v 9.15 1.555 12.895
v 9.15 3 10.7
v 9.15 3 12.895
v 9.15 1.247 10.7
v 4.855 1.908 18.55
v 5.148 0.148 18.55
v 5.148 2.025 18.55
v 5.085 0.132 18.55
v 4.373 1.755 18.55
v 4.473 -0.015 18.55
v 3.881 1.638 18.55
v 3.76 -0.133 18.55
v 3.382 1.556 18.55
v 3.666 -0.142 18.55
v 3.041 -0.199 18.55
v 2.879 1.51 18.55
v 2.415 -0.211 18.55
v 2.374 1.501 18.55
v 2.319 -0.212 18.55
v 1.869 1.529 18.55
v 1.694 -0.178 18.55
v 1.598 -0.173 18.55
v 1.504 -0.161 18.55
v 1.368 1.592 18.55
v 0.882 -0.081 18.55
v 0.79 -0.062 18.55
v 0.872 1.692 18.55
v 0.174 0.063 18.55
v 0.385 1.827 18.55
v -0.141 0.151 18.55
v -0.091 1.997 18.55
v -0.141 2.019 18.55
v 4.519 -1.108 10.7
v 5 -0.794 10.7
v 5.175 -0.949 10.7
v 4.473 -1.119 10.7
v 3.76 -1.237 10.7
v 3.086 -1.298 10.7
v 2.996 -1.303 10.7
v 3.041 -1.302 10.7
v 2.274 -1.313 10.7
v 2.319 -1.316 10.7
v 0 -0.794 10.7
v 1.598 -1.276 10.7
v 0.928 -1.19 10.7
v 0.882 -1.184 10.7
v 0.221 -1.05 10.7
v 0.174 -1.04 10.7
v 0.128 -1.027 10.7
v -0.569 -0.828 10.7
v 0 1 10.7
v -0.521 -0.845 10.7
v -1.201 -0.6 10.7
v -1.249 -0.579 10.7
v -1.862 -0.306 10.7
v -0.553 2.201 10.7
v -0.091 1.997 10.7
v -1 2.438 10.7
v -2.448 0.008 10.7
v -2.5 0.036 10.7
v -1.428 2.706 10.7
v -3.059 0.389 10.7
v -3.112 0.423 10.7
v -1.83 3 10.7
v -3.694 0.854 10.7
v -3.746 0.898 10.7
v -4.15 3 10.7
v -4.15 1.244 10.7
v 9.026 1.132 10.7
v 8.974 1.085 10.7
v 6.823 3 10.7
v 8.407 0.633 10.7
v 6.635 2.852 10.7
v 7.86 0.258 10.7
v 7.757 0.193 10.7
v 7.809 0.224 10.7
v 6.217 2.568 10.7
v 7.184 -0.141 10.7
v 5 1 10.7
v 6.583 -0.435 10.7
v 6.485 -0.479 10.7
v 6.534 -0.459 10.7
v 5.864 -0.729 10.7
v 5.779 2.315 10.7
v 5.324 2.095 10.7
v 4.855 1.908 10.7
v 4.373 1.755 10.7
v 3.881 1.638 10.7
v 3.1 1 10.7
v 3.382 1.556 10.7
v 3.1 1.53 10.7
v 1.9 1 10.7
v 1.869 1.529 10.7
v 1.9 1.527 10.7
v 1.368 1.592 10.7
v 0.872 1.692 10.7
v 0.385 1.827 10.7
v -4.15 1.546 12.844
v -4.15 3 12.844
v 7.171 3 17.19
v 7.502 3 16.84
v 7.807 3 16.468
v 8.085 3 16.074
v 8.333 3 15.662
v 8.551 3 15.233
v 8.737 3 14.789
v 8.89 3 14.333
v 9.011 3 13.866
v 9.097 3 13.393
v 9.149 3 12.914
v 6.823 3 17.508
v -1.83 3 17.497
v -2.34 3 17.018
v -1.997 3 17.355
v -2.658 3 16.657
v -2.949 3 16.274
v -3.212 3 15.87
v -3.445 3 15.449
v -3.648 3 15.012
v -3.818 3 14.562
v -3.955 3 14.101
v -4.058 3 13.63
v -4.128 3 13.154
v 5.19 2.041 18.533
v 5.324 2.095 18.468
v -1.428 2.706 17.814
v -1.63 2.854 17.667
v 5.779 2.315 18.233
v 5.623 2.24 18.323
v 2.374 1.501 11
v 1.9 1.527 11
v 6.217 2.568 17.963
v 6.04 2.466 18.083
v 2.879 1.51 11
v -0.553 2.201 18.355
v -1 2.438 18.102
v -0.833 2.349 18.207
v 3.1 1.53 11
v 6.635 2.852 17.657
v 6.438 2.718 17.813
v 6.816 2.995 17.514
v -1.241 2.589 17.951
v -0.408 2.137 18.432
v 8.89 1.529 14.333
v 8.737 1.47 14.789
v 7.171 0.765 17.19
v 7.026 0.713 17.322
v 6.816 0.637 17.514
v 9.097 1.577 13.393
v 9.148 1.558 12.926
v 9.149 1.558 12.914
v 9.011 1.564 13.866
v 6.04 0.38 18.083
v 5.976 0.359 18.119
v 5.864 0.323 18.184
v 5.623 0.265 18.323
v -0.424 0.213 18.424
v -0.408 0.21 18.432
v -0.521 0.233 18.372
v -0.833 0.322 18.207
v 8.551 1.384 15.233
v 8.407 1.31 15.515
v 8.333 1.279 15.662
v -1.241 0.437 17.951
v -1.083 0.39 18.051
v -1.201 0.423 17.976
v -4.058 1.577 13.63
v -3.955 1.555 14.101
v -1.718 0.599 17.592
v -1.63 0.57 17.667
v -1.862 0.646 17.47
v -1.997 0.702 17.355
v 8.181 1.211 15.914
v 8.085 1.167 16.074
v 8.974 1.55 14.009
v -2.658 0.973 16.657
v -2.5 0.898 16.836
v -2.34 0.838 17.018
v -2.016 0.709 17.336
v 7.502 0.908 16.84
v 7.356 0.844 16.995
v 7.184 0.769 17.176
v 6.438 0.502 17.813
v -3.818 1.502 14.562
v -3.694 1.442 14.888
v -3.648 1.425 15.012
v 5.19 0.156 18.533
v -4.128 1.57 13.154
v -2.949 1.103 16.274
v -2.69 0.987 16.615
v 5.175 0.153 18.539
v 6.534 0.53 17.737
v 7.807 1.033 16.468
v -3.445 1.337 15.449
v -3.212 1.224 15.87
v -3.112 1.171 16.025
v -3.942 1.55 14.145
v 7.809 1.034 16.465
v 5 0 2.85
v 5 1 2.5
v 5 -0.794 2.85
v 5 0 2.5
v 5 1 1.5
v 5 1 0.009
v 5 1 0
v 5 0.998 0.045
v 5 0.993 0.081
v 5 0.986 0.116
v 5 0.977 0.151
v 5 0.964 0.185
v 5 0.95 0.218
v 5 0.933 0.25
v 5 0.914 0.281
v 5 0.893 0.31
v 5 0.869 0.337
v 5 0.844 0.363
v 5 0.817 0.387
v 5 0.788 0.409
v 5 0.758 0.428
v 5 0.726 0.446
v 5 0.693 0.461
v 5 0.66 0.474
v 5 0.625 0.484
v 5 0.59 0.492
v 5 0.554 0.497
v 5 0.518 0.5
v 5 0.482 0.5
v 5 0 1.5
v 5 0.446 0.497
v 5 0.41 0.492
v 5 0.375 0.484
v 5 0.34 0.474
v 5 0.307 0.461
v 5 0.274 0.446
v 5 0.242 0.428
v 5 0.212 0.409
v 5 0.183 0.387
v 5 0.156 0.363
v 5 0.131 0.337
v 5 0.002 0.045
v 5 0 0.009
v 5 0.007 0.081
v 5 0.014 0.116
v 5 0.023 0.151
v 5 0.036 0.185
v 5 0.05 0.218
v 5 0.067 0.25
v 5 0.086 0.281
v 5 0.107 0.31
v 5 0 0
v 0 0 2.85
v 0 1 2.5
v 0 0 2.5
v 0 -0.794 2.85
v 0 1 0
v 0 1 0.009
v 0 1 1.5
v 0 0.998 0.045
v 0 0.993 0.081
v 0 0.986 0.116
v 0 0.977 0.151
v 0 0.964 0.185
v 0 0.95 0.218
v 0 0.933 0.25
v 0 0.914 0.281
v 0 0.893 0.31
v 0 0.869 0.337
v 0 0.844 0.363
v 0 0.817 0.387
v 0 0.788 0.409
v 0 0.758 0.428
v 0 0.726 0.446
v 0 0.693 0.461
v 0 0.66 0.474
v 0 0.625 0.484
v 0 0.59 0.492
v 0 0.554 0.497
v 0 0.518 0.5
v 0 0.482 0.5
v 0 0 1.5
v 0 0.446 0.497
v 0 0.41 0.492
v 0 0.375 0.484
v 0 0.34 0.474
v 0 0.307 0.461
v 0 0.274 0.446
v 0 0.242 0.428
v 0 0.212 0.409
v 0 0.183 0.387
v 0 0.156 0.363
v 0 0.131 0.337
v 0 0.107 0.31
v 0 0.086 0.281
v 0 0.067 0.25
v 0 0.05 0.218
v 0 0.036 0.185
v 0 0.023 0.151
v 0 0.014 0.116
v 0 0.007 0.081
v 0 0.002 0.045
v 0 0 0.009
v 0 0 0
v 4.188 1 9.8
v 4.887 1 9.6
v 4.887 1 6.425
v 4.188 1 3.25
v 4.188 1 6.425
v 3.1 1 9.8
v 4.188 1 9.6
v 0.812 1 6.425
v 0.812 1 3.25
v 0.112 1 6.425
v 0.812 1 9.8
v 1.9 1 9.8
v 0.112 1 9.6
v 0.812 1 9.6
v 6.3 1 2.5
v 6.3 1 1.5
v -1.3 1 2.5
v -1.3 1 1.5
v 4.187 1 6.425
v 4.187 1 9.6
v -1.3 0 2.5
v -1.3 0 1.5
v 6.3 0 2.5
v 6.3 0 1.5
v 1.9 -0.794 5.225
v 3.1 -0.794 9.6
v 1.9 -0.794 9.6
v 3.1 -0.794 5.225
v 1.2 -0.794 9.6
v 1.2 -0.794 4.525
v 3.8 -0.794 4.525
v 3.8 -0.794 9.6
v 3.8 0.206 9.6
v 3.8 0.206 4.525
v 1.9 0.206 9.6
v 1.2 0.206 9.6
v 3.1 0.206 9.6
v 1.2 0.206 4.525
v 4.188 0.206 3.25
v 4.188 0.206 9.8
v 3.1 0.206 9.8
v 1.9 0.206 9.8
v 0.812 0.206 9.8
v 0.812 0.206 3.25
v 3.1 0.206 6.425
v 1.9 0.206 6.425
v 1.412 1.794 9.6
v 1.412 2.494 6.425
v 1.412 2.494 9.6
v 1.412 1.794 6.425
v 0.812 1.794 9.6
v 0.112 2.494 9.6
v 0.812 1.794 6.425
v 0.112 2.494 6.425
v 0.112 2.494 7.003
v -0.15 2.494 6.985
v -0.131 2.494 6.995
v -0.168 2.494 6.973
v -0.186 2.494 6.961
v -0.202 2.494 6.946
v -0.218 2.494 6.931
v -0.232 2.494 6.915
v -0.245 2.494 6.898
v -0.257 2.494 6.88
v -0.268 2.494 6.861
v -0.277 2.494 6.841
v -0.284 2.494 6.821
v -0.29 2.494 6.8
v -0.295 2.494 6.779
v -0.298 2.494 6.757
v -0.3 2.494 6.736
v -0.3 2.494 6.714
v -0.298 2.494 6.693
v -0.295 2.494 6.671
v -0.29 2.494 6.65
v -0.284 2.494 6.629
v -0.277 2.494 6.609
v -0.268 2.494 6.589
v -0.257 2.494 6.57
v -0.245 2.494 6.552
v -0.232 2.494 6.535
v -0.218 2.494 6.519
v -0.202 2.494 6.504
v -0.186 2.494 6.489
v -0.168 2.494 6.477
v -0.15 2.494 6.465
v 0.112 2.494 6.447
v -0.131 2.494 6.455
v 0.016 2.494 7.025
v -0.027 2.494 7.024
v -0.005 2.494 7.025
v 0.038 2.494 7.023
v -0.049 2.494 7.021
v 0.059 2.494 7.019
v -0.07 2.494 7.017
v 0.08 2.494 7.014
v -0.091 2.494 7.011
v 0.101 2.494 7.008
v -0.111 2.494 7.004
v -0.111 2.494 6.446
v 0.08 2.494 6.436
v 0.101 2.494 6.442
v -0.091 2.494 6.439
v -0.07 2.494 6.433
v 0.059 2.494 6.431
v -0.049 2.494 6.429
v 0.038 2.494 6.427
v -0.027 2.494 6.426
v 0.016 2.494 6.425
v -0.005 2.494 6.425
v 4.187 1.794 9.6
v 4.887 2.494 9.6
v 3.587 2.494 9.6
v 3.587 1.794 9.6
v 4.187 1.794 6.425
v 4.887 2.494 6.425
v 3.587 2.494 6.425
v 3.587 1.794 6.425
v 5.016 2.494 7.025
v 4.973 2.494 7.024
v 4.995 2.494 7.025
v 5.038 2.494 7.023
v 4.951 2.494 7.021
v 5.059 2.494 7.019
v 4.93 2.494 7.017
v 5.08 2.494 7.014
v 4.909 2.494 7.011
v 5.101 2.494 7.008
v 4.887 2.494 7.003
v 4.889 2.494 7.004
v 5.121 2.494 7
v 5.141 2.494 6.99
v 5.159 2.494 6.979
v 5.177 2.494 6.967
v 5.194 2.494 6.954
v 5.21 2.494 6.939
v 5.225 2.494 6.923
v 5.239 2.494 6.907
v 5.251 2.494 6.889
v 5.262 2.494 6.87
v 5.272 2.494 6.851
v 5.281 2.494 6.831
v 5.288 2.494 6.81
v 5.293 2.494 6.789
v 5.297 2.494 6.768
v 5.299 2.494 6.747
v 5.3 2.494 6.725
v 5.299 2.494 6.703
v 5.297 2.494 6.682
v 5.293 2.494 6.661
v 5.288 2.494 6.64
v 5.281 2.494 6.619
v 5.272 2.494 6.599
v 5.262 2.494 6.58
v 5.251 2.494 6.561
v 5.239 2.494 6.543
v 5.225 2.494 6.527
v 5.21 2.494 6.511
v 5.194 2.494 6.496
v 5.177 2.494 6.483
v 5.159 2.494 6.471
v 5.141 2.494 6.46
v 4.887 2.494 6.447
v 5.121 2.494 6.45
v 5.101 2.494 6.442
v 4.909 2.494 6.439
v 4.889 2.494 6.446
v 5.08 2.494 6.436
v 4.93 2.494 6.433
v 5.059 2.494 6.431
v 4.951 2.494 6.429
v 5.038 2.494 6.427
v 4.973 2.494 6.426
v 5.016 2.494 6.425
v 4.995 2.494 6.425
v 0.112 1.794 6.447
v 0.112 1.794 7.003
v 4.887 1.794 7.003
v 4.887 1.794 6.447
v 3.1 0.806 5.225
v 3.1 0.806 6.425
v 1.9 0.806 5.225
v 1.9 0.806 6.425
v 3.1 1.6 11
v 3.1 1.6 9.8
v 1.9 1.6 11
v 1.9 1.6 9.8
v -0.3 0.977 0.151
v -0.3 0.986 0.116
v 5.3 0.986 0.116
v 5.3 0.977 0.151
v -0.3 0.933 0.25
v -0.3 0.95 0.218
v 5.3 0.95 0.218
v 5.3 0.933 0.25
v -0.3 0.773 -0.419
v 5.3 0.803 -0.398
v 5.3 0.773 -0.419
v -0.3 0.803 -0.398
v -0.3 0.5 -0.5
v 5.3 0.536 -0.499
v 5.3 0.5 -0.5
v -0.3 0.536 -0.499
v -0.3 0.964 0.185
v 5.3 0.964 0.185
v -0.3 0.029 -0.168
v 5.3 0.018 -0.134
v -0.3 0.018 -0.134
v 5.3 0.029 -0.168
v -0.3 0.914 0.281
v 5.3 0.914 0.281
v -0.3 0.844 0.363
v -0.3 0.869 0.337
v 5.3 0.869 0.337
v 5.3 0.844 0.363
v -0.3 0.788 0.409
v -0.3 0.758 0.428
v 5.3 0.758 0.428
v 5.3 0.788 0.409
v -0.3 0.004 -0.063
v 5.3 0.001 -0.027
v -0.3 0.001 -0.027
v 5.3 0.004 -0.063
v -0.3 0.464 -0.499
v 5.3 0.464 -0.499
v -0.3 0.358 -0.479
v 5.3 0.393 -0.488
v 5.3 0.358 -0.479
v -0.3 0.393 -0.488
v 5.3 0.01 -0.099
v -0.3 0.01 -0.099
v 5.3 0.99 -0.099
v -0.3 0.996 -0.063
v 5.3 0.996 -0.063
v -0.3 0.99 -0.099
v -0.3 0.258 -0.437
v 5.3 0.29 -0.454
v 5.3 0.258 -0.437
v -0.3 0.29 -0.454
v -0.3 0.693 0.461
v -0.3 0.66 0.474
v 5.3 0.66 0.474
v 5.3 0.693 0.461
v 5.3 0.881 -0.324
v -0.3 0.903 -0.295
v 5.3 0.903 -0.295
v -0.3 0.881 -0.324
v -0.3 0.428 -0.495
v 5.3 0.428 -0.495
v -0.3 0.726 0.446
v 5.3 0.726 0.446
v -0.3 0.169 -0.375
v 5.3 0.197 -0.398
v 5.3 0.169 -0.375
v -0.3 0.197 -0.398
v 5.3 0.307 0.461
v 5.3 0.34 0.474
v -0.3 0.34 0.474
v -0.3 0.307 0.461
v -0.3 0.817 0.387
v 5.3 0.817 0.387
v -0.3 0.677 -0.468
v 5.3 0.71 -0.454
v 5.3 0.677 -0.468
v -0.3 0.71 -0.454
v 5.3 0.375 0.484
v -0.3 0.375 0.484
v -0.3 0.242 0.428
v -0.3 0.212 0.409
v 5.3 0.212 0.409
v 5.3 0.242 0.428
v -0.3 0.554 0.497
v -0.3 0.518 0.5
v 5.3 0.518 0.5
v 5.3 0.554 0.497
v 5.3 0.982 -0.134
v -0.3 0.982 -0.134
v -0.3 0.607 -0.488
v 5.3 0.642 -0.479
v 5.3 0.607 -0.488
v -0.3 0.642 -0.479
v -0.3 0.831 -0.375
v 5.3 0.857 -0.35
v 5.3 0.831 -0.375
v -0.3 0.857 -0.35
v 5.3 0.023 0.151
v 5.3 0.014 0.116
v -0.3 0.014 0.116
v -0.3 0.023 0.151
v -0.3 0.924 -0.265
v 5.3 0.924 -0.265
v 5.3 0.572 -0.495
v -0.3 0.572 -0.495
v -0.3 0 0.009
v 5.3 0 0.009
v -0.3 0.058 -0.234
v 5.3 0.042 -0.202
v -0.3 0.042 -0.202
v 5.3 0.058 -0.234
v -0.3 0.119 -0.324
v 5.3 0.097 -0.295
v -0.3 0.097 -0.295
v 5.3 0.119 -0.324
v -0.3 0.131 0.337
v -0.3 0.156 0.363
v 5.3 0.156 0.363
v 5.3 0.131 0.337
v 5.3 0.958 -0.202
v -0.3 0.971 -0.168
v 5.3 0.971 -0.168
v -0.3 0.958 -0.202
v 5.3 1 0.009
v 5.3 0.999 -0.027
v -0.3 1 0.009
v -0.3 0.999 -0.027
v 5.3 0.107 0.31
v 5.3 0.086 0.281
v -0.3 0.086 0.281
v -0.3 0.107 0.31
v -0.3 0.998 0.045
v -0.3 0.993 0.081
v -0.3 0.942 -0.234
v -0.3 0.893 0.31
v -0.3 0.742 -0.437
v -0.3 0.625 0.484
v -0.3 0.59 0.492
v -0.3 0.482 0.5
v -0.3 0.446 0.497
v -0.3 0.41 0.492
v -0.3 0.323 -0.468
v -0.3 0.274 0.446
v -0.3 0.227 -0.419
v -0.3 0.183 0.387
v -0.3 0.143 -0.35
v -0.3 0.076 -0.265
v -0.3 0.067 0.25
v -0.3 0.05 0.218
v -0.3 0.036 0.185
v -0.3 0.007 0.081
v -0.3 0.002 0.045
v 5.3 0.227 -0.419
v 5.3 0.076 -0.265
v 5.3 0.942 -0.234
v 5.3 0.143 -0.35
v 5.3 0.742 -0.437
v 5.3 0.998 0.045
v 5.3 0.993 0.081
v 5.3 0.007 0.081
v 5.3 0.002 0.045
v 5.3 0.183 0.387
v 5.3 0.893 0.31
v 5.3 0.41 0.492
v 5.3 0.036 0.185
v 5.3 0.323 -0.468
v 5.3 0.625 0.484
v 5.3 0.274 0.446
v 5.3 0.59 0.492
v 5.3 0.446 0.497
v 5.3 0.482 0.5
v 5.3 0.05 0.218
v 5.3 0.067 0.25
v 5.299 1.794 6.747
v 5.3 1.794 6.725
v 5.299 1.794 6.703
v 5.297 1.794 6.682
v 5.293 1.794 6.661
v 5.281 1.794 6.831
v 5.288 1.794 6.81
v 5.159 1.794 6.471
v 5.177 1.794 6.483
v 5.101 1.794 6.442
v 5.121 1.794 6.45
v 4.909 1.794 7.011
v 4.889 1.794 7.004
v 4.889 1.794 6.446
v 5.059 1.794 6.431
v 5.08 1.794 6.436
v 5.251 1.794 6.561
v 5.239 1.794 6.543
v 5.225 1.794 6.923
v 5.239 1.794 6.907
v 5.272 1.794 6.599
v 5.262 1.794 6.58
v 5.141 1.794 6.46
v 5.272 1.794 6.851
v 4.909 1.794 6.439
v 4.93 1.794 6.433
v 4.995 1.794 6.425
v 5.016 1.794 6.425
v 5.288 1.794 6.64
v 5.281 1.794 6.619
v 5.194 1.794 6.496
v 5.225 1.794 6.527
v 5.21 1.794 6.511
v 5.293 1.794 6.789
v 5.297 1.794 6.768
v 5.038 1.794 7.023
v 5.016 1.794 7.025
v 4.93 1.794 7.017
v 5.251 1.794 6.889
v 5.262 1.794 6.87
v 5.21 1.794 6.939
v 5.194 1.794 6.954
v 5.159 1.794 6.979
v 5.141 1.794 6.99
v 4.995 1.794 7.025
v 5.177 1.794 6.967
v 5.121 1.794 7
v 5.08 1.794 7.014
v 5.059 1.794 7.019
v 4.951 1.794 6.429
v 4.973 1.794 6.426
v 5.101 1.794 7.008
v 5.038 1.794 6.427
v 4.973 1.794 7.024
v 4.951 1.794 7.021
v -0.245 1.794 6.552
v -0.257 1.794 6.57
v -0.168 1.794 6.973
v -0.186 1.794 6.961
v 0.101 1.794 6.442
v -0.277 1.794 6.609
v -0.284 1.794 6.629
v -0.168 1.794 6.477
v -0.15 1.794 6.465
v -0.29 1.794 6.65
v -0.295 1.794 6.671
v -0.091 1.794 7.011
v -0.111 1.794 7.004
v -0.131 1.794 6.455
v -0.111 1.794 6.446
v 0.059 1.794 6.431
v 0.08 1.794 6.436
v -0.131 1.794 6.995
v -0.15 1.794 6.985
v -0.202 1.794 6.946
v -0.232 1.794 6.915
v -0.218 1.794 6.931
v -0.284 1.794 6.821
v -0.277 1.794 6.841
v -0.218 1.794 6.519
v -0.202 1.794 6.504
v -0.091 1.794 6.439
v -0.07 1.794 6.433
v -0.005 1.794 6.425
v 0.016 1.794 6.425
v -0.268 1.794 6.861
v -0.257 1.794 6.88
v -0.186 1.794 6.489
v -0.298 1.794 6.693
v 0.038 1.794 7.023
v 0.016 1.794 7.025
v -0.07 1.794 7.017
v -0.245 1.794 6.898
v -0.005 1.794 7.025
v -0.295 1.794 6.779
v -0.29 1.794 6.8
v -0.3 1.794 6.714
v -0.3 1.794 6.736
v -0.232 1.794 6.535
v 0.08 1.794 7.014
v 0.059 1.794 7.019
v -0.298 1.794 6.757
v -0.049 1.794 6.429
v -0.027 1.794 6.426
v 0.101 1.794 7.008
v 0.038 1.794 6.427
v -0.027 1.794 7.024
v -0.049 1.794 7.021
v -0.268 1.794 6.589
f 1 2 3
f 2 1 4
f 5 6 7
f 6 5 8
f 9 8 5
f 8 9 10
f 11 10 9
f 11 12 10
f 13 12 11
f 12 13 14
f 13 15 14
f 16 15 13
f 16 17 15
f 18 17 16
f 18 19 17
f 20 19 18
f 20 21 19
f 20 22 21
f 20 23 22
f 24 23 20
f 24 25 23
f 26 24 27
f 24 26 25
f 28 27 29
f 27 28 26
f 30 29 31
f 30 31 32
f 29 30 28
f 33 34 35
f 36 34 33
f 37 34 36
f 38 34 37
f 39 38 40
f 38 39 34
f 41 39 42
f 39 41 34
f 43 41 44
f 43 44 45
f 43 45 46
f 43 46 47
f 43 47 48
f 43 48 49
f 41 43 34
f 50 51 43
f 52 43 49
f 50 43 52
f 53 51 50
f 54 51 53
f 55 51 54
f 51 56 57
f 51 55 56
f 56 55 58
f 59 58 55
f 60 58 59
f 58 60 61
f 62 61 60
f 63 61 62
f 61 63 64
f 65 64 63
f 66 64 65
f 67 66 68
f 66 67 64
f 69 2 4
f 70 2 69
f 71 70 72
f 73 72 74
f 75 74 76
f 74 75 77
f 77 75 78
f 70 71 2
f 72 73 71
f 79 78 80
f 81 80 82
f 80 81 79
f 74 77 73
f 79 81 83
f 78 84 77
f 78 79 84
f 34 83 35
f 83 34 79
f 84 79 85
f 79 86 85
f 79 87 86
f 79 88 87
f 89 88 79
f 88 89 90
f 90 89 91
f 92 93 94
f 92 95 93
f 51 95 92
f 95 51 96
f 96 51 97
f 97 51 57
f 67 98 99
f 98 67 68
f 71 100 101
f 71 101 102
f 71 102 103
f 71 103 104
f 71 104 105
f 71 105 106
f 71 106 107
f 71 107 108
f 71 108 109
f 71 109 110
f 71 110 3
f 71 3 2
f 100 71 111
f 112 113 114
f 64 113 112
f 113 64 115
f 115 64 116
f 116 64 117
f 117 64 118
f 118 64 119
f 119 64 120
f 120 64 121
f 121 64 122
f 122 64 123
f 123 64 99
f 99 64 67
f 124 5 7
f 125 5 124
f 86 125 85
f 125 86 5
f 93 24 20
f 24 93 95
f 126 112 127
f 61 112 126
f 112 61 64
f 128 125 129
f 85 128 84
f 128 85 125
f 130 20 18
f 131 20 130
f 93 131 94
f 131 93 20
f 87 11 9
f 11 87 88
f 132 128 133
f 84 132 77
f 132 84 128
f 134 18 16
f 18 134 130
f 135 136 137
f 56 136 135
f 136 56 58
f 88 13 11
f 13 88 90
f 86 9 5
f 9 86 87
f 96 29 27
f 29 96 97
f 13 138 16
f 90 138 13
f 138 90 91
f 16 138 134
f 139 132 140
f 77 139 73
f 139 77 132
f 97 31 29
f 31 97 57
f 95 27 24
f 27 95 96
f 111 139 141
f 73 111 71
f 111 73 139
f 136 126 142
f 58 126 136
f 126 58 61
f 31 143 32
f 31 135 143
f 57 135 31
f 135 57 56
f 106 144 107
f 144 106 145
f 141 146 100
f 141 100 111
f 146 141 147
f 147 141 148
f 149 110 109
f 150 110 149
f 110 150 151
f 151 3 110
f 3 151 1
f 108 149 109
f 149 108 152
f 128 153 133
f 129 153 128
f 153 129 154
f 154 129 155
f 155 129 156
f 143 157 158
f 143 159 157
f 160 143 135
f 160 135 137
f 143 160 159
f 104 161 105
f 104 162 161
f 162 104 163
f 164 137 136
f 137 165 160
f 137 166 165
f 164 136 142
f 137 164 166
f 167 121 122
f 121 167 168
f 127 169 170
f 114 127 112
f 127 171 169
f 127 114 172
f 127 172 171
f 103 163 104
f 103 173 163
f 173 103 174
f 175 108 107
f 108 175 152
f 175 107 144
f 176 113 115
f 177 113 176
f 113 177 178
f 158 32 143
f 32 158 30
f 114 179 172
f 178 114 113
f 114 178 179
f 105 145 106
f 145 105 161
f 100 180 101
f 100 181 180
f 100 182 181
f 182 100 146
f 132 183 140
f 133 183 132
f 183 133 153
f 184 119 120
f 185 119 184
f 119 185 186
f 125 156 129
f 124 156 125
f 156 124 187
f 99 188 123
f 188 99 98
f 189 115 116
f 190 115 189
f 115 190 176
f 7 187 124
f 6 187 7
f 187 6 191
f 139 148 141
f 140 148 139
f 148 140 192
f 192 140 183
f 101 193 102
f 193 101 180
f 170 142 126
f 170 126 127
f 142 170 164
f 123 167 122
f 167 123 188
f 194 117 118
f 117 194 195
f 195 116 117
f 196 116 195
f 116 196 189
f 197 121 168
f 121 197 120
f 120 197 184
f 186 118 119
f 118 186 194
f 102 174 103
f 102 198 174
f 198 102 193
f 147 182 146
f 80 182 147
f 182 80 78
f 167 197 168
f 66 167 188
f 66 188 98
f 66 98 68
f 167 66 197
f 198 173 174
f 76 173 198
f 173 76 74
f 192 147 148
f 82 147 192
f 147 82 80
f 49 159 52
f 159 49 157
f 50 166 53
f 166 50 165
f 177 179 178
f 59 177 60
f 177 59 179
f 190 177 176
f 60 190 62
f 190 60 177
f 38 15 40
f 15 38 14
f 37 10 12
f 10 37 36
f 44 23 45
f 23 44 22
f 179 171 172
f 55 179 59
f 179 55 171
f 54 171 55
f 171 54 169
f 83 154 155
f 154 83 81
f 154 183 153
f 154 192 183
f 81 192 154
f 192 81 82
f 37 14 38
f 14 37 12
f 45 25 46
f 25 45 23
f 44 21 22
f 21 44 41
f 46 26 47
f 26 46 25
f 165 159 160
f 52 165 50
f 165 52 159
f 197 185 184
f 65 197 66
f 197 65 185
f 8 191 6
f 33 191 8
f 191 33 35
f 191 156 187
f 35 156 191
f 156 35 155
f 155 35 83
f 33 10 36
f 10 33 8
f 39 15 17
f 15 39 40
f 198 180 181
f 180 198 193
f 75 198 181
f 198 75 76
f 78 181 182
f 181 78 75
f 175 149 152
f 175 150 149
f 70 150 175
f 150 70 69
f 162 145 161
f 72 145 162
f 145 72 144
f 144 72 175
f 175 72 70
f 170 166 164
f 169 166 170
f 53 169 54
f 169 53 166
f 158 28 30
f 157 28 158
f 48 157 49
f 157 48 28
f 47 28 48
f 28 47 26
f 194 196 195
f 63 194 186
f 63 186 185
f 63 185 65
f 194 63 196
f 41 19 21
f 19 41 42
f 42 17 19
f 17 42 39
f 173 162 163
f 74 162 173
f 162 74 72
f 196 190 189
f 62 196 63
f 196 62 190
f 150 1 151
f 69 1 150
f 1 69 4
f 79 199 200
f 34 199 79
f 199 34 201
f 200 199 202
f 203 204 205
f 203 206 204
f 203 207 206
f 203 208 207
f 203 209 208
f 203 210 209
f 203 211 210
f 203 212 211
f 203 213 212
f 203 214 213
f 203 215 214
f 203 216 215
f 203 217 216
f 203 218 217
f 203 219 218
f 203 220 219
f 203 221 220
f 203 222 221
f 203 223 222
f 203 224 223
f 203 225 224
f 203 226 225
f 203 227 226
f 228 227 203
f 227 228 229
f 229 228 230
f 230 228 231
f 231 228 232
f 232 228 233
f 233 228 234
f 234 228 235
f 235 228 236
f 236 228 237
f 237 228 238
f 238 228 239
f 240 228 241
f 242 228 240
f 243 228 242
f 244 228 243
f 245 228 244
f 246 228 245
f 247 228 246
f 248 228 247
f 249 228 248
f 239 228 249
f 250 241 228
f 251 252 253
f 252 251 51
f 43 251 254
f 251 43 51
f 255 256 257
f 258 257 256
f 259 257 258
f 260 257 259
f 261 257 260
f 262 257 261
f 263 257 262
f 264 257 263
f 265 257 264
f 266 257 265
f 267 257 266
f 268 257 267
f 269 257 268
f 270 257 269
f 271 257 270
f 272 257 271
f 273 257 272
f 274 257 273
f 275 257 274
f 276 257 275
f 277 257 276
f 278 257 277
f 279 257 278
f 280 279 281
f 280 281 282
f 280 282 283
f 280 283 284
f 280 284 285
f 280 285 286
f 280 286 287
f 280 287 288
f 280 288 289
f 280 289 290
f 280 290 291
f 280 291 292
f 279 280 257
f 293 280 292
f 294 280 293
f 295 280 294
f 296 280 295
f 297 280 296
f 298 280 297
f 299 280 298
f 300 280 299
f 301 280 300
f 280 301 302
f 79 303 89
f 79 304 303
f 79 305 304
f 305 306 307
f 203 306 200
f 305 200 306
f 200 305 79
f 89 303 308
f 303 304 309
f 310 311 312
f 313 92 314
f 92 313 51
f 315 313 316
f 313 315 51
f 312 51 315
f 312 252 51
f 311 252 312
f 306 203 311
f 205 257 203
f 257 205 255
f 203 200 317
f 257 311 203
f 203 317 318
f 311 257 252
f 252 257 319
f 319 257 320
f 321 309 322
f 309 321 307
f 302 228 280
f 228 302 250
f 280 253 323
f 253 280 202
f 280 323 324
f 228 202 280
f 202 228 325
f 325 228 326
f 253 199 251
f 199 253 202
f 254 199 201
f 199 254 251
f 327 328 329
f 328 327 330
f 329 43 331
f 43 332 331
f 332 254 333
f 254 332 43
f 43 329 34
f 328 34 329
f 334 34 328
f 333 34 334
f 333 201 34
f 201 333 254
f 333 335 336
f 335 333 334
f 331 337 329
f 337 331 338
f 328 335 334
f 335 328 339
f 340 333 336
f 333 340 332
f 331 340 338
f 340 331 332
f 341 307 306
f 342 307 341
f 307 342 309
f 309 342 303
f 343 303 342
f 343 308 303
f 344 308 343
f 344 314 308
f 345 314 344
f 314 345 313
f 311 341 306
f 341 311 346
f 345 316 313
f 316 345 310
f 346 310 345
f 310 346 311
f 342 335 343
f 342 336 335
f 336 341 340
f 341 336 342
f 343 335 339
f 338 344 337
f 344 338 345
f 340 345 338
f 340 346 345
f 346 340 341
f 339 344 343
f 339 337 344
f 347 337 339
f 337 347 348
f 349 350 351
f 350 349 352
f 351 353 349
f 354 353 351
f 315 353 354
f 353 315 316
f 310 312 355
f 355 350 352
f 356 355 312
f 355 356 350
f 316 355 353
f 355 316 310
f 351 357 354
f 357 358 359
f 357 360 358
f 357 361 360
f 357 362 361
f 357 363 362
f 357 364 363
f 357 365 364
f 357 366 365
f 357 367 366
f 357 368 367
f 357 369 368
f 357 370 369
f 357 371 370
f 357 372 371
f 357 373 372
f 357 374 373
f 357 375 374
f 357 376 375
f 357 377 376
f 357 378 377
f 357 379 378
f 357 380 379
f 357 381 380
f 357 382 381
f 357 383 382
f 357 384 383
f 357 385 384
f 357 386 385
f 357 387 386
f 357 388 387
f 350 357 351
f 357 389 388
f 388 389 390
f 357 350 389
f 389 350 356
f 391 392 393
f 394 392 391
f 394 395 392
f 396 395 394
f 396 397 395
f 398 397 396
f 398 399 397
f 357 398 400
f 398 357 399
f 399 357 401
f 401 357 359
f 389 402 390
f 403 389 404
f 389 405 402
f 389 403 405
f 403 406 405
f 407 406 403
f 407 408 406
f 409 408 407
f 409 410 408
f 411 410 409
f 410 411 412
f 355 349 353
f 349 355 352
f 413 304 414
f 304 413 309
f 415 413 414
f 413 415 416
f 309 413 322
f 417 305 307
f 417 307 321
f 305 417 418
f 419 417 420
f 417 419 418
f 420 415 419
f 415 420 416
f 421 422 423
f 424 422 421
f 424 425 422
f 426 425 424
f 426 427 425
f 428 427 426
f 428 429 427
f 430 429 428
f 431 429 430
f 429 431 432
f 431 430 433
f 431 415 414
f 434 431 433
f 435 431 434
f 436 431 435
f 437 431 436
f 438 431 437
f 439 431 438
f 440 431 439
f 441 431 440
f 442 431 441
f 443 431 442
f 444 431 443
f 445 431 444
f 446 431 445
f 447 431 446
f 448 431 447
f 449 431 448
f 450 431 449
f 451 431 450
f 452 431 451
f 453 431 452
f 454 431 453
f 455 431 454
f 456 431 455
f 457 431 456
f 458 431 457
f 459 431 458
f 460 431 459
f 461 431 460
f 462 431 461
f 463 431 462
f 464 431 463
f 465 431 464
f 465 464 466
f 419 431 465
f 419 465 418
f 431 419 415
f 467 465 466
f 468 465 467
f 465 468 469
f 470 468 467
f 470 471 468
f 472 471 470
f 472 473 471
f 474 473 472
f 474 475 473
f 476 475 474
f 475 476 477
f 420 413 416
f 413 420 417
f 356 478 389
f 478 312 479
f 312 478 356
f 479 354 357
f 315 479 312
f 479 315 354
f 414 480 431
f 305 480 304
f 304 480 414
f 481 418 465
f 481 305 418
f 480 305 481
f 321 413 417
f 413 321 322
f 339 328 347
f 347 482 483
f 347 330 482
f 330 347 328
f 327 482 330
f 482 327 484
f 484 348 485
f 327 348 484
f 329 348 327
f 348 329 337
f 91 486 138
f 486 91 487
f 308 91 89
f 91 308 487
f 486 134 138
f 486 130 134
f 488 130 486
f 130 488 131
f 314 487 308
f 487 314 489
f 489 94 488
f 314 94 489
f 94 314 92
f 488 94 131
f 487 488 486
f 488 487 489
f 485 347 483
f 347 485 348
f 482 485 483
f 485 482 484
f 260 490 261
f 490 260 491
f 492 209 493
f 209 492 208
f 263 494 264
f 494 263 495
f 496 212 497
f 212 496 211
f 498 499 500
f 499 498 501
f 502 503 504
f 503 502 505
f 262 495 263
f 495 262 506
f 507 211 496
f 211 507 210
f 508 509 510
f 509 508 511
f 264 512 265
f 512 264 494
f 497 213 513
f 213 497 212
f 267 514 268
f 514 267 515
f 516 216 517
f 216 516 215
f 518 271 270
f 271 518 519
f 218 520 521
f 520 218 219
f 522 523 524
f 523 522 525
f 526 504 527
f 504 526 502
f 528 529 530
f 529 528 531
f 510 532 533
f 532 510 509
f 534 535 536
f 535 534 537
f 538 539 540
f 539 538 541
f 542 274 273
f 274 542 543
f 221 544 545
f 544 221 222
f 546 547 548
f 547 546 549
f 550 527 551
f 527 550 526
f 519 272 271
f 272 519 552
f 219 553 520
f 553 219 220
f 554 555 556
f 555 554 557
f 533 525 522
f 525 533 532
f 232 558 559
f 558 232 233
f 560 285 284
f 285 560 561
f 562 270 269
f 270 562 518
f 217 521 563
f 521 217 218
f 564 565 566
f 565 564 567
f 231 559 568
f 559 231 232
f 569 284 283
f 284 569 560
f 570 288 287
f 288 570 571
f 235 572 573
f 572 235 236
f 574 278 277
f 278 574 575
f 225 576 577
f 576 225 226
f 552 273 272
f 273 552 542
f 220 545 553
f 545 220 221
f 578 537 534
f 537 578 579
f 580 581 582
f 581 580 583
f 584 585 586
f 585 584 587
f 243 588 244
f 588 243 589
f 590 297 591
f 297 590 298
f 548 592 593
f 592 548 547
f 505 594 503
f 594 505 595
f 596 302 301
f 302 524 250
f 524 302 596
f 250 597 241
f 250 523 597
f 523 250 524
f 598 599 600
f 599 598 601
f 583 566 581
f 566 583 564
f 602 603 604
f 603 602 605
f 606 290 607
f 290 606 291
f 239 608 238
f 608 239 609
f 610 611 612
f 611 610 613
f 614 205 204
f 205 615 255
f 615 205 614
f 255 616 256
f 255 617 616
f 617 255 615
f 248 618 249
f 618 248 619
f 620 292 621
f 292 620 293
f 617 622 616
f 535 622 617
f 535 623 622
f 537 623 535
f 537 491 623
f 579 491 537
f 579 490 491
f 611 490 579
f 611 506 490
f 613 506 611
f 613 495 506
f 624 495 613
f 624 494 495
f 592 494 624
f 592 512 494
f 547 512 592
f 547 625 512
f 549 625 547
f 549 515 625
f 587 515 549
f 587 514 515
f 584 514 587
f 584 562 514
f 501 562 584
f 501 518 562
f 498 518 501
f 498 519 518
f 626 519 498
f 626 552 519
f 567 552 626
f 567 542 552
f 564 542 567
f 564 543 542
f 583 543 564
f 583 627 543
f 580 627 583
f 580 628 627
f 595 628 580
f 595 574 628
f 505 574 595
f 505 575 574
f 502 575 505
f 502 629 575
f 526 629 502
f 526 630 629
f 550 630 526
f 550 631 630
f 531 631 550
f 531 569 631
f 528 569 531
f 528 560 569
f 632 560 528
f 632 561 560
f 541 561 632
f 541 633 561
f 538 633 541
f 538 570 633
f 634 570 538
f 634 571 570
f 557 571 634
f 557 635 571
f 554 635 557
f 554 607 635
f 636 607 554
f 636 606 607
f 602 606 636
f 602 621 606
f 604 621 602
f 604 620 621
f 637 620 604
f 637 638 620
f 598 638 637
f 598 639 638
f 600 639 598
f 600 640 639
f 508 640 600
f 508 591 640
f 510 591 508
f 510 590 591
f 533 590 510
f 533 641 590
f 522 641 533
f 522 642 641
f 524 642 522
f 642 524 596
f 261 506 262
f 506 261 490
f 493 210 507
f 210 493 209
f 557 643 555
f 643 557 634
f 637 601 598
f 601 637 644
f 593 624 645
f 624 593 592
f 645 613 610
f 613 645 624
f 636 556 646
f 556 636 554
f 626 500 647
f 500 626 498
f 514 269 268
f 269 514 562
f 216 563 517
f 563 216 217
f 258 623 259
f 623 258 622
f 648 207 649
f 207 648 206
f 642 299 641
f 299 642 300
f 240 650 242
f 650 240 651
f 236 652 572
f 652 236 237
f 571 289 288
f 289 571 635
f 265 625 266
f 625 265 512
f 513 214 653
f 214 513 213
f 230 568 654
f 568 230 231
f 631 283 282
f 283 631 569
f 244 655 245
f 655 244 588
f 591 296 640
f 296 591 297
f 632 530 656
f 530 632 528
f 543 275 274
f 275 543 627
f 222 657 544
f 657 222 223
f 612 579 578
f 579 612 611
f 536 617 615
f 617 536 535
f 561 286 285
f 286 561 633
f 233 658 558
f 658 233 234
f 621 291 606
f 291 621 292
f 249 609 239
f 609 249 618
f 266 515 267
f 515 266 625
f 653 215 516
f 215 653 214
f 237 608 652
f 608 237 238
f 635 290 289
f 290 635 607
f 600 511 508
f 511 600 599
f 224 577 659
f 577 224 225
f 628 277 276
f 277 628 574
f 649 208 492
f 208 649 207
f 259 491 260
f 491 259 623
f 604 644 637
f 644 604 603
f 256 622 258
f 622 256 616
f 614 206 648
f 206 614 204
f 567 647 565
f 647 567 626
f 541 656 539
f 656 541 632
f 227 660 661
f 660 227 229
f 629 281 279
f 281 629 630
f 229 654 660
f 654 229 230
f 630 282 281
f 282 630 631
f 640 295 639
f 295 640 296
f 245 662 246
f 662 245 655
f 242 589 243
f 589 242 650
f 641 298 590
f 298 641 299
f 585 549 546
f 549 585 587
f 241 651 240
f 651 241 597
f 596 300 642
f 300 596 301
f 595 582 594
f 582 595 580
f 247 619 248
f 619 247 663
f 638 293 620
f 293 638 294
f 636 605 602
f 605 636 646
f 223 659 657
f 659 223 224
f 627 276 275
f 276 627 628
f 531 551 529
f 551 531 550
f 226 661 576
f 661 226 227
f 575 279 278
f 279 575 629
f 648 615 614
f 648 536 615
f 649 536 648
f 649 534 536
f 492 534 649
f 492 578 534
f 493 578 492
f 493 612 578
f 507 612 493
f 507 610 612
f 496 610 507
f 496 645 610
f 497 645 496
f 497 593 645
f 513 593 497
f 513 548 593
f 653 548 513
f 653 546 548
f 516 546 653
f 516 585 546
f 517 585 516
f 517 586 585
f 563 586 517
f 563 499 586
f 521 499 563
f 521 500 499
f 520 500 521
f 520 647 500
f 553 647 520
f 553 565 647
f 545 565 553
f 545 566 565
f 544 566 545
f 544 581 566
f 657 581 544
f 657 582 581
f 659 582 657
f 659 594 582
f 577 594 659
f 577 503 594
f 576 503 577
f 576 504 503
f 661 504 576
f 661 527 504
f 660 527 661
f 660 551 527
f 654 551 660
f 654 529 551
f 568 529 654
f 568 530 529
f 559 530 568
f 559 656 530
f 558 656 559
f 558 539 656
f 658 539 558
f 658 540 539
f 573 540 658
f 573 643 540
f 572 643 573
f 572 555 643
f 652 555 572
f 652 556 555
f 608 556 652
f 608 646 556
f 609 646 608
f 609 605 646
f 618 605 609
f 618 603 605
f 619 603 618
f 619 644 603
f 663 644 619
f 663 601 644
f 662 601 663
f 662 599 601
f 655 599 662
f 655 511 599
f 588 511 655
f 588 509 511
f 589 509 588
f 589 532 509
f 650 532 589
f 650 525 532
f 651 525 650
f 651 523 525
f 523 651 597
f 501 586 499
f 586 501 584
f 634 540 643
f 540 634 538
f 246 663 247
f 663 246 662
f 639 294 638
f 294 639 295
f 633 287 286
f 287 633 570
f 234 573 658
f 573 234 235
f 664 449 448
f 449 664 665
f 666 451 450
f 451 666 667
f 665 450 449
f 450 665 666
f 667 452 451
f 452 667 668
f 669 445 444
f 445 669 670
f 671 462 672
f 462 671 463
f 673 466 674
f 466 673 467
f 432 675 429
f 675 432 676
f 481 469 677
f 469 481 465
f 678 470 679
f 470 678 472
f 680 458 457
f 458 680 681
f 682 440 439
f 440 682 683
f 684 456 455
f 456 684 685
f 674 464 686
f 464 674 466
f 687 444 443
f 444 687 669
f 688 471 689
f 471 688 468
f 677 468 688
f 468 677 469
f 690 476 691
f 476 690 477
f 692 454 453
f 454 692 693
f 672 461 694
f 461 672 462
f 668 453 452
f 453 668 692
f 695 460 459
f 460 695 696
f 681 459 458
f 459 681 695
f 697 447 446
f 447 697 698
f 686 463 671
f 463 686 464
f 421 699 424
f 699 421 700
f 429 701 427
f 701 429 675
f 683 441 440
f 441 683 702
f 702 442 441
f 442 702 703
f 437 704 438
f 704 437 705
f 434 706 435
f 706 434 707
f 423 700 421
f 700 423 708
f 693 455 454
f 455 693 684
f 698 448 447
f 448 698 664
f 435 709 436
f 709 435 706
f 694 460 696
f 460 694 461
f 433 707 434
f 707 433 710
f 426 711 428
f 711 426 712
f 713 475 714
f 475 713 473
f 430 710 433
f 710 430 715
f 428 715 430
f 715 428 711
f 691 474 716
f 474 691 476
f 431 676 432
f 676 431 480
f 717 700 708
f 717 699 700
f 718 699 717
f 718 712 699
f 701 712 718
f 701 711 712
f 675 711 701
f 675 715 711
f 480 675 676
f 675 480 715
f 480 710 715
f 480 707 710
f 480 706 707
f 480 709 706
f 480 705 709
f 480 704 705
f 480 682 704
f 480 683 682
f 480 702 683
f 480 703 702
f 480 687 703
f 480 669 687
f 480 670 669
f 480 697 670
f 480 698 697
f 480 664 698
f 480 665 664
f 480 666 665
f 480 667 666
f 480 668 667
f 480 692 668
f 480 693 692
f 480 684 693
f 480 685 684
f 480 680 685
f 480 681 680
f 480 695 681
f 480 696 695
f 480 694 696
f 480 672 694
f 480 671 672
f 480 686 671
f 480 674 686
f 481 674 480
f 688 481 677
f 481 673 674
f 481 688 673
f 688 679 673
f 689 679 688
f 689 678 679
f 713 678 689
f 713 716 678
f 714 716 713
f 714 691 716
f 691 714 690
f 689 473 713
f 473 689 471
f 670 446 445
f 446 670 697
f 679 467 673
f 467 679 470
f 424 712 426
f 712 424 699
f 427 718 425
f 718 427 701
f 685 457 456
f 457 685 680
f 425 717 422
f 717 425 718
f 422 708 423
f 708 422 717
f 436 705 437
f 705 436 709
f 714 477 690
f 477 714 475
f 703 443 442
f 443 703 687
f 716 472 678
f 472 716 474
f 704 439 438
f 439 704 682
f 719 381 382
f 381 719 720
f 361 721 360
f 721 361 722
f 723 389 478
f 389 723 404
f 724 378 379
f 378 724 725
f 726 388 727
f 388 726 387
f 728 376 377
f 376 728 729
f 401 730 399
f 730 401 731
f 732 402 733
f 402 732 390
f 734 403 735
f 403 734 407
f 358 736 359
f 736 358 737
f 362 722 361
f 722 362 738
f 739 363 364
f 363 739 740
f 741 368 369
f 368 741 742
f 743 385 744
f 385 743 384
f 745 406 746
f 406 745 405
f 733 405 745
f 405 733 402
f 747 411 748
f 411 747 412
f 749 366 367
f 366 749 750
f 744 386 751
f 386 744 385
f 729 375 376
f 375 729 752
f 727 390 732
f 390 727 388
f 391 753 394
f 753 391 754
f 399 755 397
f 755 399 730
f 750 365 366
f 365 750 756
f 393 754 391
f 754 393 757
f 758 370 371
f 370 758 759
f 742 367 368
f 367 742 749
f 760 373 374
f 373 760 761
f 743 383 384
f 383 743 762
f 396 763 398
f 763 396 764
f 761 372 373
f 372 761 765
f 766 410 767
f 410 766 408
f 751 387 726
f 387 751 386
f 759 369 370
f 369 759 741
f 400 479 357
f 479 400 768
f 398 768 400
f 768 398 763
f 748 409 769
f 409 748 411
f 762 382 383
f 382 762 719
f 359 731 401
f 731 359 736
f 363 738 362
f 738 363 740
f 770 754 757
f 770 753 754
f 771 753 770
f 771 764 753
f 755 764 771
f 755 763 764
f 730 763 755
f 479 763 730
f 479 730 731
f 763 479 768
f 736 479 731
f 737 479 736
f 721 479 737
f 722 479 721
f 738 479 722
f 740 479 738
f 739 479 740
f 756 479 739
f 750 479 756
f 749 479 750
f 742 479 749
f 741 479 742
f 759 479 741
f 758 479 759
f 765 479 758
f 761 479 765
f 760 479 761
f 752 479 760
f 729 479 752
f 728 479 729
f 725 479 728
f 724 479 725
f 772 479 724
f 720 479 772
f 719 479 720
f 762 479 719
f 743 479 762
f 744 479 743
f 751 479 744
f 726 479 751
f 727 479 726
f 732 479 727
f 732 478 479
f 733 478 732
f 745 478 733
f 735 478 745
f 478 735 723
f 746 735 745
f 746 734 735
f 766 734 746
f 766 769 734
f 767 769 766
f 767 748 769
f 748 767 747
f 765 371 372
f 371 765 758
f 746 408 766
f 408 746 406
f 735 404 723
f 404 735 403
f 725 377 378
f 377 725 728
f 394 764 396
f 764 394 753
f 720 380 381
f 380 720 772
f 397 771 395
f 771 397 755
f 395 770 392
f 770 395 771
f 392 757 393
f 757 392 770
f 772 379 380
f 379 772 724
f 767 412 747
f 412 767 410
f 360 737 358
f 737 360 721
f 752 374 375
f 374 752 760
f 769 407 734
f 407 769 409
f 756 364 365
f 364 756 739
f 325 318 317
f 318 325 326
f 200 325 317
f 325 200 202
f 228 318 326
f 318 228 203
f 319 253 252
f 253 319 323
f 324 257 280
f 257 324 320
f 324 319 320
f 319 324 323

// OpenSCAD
/*
    This file is part of the DodoHand project. This project aims to create 
    an open implementation of the DataHand keyboard, capable of being created
    with commercial 3D printing services.

    Copyright (C) 2013 Scott Fohey

    This program is free software: you can redistribute it and/or modify
    it under the terms of the GNU General Public License as published by
    the Free Software Foundation, either version 3 of the License, or
    (at your option) any later version.

    This program is distributed in the hope that it will be useful,
    but WITHOUT ANY WARRANTY; without even the implied warranty of
    MERCHANTABILITY or FITNESS FOR A PARTICULAR PURPOSE.  See the
    GNU General Public License for more details.

    You should have received a copy of the GNU General Public License
    along with this program.  If not, see <http://www.gnu.org/licenses/>.
*/

use <lever.scad>

include <dimensions.scad>;

small_key(0, 0, 0, 0);
